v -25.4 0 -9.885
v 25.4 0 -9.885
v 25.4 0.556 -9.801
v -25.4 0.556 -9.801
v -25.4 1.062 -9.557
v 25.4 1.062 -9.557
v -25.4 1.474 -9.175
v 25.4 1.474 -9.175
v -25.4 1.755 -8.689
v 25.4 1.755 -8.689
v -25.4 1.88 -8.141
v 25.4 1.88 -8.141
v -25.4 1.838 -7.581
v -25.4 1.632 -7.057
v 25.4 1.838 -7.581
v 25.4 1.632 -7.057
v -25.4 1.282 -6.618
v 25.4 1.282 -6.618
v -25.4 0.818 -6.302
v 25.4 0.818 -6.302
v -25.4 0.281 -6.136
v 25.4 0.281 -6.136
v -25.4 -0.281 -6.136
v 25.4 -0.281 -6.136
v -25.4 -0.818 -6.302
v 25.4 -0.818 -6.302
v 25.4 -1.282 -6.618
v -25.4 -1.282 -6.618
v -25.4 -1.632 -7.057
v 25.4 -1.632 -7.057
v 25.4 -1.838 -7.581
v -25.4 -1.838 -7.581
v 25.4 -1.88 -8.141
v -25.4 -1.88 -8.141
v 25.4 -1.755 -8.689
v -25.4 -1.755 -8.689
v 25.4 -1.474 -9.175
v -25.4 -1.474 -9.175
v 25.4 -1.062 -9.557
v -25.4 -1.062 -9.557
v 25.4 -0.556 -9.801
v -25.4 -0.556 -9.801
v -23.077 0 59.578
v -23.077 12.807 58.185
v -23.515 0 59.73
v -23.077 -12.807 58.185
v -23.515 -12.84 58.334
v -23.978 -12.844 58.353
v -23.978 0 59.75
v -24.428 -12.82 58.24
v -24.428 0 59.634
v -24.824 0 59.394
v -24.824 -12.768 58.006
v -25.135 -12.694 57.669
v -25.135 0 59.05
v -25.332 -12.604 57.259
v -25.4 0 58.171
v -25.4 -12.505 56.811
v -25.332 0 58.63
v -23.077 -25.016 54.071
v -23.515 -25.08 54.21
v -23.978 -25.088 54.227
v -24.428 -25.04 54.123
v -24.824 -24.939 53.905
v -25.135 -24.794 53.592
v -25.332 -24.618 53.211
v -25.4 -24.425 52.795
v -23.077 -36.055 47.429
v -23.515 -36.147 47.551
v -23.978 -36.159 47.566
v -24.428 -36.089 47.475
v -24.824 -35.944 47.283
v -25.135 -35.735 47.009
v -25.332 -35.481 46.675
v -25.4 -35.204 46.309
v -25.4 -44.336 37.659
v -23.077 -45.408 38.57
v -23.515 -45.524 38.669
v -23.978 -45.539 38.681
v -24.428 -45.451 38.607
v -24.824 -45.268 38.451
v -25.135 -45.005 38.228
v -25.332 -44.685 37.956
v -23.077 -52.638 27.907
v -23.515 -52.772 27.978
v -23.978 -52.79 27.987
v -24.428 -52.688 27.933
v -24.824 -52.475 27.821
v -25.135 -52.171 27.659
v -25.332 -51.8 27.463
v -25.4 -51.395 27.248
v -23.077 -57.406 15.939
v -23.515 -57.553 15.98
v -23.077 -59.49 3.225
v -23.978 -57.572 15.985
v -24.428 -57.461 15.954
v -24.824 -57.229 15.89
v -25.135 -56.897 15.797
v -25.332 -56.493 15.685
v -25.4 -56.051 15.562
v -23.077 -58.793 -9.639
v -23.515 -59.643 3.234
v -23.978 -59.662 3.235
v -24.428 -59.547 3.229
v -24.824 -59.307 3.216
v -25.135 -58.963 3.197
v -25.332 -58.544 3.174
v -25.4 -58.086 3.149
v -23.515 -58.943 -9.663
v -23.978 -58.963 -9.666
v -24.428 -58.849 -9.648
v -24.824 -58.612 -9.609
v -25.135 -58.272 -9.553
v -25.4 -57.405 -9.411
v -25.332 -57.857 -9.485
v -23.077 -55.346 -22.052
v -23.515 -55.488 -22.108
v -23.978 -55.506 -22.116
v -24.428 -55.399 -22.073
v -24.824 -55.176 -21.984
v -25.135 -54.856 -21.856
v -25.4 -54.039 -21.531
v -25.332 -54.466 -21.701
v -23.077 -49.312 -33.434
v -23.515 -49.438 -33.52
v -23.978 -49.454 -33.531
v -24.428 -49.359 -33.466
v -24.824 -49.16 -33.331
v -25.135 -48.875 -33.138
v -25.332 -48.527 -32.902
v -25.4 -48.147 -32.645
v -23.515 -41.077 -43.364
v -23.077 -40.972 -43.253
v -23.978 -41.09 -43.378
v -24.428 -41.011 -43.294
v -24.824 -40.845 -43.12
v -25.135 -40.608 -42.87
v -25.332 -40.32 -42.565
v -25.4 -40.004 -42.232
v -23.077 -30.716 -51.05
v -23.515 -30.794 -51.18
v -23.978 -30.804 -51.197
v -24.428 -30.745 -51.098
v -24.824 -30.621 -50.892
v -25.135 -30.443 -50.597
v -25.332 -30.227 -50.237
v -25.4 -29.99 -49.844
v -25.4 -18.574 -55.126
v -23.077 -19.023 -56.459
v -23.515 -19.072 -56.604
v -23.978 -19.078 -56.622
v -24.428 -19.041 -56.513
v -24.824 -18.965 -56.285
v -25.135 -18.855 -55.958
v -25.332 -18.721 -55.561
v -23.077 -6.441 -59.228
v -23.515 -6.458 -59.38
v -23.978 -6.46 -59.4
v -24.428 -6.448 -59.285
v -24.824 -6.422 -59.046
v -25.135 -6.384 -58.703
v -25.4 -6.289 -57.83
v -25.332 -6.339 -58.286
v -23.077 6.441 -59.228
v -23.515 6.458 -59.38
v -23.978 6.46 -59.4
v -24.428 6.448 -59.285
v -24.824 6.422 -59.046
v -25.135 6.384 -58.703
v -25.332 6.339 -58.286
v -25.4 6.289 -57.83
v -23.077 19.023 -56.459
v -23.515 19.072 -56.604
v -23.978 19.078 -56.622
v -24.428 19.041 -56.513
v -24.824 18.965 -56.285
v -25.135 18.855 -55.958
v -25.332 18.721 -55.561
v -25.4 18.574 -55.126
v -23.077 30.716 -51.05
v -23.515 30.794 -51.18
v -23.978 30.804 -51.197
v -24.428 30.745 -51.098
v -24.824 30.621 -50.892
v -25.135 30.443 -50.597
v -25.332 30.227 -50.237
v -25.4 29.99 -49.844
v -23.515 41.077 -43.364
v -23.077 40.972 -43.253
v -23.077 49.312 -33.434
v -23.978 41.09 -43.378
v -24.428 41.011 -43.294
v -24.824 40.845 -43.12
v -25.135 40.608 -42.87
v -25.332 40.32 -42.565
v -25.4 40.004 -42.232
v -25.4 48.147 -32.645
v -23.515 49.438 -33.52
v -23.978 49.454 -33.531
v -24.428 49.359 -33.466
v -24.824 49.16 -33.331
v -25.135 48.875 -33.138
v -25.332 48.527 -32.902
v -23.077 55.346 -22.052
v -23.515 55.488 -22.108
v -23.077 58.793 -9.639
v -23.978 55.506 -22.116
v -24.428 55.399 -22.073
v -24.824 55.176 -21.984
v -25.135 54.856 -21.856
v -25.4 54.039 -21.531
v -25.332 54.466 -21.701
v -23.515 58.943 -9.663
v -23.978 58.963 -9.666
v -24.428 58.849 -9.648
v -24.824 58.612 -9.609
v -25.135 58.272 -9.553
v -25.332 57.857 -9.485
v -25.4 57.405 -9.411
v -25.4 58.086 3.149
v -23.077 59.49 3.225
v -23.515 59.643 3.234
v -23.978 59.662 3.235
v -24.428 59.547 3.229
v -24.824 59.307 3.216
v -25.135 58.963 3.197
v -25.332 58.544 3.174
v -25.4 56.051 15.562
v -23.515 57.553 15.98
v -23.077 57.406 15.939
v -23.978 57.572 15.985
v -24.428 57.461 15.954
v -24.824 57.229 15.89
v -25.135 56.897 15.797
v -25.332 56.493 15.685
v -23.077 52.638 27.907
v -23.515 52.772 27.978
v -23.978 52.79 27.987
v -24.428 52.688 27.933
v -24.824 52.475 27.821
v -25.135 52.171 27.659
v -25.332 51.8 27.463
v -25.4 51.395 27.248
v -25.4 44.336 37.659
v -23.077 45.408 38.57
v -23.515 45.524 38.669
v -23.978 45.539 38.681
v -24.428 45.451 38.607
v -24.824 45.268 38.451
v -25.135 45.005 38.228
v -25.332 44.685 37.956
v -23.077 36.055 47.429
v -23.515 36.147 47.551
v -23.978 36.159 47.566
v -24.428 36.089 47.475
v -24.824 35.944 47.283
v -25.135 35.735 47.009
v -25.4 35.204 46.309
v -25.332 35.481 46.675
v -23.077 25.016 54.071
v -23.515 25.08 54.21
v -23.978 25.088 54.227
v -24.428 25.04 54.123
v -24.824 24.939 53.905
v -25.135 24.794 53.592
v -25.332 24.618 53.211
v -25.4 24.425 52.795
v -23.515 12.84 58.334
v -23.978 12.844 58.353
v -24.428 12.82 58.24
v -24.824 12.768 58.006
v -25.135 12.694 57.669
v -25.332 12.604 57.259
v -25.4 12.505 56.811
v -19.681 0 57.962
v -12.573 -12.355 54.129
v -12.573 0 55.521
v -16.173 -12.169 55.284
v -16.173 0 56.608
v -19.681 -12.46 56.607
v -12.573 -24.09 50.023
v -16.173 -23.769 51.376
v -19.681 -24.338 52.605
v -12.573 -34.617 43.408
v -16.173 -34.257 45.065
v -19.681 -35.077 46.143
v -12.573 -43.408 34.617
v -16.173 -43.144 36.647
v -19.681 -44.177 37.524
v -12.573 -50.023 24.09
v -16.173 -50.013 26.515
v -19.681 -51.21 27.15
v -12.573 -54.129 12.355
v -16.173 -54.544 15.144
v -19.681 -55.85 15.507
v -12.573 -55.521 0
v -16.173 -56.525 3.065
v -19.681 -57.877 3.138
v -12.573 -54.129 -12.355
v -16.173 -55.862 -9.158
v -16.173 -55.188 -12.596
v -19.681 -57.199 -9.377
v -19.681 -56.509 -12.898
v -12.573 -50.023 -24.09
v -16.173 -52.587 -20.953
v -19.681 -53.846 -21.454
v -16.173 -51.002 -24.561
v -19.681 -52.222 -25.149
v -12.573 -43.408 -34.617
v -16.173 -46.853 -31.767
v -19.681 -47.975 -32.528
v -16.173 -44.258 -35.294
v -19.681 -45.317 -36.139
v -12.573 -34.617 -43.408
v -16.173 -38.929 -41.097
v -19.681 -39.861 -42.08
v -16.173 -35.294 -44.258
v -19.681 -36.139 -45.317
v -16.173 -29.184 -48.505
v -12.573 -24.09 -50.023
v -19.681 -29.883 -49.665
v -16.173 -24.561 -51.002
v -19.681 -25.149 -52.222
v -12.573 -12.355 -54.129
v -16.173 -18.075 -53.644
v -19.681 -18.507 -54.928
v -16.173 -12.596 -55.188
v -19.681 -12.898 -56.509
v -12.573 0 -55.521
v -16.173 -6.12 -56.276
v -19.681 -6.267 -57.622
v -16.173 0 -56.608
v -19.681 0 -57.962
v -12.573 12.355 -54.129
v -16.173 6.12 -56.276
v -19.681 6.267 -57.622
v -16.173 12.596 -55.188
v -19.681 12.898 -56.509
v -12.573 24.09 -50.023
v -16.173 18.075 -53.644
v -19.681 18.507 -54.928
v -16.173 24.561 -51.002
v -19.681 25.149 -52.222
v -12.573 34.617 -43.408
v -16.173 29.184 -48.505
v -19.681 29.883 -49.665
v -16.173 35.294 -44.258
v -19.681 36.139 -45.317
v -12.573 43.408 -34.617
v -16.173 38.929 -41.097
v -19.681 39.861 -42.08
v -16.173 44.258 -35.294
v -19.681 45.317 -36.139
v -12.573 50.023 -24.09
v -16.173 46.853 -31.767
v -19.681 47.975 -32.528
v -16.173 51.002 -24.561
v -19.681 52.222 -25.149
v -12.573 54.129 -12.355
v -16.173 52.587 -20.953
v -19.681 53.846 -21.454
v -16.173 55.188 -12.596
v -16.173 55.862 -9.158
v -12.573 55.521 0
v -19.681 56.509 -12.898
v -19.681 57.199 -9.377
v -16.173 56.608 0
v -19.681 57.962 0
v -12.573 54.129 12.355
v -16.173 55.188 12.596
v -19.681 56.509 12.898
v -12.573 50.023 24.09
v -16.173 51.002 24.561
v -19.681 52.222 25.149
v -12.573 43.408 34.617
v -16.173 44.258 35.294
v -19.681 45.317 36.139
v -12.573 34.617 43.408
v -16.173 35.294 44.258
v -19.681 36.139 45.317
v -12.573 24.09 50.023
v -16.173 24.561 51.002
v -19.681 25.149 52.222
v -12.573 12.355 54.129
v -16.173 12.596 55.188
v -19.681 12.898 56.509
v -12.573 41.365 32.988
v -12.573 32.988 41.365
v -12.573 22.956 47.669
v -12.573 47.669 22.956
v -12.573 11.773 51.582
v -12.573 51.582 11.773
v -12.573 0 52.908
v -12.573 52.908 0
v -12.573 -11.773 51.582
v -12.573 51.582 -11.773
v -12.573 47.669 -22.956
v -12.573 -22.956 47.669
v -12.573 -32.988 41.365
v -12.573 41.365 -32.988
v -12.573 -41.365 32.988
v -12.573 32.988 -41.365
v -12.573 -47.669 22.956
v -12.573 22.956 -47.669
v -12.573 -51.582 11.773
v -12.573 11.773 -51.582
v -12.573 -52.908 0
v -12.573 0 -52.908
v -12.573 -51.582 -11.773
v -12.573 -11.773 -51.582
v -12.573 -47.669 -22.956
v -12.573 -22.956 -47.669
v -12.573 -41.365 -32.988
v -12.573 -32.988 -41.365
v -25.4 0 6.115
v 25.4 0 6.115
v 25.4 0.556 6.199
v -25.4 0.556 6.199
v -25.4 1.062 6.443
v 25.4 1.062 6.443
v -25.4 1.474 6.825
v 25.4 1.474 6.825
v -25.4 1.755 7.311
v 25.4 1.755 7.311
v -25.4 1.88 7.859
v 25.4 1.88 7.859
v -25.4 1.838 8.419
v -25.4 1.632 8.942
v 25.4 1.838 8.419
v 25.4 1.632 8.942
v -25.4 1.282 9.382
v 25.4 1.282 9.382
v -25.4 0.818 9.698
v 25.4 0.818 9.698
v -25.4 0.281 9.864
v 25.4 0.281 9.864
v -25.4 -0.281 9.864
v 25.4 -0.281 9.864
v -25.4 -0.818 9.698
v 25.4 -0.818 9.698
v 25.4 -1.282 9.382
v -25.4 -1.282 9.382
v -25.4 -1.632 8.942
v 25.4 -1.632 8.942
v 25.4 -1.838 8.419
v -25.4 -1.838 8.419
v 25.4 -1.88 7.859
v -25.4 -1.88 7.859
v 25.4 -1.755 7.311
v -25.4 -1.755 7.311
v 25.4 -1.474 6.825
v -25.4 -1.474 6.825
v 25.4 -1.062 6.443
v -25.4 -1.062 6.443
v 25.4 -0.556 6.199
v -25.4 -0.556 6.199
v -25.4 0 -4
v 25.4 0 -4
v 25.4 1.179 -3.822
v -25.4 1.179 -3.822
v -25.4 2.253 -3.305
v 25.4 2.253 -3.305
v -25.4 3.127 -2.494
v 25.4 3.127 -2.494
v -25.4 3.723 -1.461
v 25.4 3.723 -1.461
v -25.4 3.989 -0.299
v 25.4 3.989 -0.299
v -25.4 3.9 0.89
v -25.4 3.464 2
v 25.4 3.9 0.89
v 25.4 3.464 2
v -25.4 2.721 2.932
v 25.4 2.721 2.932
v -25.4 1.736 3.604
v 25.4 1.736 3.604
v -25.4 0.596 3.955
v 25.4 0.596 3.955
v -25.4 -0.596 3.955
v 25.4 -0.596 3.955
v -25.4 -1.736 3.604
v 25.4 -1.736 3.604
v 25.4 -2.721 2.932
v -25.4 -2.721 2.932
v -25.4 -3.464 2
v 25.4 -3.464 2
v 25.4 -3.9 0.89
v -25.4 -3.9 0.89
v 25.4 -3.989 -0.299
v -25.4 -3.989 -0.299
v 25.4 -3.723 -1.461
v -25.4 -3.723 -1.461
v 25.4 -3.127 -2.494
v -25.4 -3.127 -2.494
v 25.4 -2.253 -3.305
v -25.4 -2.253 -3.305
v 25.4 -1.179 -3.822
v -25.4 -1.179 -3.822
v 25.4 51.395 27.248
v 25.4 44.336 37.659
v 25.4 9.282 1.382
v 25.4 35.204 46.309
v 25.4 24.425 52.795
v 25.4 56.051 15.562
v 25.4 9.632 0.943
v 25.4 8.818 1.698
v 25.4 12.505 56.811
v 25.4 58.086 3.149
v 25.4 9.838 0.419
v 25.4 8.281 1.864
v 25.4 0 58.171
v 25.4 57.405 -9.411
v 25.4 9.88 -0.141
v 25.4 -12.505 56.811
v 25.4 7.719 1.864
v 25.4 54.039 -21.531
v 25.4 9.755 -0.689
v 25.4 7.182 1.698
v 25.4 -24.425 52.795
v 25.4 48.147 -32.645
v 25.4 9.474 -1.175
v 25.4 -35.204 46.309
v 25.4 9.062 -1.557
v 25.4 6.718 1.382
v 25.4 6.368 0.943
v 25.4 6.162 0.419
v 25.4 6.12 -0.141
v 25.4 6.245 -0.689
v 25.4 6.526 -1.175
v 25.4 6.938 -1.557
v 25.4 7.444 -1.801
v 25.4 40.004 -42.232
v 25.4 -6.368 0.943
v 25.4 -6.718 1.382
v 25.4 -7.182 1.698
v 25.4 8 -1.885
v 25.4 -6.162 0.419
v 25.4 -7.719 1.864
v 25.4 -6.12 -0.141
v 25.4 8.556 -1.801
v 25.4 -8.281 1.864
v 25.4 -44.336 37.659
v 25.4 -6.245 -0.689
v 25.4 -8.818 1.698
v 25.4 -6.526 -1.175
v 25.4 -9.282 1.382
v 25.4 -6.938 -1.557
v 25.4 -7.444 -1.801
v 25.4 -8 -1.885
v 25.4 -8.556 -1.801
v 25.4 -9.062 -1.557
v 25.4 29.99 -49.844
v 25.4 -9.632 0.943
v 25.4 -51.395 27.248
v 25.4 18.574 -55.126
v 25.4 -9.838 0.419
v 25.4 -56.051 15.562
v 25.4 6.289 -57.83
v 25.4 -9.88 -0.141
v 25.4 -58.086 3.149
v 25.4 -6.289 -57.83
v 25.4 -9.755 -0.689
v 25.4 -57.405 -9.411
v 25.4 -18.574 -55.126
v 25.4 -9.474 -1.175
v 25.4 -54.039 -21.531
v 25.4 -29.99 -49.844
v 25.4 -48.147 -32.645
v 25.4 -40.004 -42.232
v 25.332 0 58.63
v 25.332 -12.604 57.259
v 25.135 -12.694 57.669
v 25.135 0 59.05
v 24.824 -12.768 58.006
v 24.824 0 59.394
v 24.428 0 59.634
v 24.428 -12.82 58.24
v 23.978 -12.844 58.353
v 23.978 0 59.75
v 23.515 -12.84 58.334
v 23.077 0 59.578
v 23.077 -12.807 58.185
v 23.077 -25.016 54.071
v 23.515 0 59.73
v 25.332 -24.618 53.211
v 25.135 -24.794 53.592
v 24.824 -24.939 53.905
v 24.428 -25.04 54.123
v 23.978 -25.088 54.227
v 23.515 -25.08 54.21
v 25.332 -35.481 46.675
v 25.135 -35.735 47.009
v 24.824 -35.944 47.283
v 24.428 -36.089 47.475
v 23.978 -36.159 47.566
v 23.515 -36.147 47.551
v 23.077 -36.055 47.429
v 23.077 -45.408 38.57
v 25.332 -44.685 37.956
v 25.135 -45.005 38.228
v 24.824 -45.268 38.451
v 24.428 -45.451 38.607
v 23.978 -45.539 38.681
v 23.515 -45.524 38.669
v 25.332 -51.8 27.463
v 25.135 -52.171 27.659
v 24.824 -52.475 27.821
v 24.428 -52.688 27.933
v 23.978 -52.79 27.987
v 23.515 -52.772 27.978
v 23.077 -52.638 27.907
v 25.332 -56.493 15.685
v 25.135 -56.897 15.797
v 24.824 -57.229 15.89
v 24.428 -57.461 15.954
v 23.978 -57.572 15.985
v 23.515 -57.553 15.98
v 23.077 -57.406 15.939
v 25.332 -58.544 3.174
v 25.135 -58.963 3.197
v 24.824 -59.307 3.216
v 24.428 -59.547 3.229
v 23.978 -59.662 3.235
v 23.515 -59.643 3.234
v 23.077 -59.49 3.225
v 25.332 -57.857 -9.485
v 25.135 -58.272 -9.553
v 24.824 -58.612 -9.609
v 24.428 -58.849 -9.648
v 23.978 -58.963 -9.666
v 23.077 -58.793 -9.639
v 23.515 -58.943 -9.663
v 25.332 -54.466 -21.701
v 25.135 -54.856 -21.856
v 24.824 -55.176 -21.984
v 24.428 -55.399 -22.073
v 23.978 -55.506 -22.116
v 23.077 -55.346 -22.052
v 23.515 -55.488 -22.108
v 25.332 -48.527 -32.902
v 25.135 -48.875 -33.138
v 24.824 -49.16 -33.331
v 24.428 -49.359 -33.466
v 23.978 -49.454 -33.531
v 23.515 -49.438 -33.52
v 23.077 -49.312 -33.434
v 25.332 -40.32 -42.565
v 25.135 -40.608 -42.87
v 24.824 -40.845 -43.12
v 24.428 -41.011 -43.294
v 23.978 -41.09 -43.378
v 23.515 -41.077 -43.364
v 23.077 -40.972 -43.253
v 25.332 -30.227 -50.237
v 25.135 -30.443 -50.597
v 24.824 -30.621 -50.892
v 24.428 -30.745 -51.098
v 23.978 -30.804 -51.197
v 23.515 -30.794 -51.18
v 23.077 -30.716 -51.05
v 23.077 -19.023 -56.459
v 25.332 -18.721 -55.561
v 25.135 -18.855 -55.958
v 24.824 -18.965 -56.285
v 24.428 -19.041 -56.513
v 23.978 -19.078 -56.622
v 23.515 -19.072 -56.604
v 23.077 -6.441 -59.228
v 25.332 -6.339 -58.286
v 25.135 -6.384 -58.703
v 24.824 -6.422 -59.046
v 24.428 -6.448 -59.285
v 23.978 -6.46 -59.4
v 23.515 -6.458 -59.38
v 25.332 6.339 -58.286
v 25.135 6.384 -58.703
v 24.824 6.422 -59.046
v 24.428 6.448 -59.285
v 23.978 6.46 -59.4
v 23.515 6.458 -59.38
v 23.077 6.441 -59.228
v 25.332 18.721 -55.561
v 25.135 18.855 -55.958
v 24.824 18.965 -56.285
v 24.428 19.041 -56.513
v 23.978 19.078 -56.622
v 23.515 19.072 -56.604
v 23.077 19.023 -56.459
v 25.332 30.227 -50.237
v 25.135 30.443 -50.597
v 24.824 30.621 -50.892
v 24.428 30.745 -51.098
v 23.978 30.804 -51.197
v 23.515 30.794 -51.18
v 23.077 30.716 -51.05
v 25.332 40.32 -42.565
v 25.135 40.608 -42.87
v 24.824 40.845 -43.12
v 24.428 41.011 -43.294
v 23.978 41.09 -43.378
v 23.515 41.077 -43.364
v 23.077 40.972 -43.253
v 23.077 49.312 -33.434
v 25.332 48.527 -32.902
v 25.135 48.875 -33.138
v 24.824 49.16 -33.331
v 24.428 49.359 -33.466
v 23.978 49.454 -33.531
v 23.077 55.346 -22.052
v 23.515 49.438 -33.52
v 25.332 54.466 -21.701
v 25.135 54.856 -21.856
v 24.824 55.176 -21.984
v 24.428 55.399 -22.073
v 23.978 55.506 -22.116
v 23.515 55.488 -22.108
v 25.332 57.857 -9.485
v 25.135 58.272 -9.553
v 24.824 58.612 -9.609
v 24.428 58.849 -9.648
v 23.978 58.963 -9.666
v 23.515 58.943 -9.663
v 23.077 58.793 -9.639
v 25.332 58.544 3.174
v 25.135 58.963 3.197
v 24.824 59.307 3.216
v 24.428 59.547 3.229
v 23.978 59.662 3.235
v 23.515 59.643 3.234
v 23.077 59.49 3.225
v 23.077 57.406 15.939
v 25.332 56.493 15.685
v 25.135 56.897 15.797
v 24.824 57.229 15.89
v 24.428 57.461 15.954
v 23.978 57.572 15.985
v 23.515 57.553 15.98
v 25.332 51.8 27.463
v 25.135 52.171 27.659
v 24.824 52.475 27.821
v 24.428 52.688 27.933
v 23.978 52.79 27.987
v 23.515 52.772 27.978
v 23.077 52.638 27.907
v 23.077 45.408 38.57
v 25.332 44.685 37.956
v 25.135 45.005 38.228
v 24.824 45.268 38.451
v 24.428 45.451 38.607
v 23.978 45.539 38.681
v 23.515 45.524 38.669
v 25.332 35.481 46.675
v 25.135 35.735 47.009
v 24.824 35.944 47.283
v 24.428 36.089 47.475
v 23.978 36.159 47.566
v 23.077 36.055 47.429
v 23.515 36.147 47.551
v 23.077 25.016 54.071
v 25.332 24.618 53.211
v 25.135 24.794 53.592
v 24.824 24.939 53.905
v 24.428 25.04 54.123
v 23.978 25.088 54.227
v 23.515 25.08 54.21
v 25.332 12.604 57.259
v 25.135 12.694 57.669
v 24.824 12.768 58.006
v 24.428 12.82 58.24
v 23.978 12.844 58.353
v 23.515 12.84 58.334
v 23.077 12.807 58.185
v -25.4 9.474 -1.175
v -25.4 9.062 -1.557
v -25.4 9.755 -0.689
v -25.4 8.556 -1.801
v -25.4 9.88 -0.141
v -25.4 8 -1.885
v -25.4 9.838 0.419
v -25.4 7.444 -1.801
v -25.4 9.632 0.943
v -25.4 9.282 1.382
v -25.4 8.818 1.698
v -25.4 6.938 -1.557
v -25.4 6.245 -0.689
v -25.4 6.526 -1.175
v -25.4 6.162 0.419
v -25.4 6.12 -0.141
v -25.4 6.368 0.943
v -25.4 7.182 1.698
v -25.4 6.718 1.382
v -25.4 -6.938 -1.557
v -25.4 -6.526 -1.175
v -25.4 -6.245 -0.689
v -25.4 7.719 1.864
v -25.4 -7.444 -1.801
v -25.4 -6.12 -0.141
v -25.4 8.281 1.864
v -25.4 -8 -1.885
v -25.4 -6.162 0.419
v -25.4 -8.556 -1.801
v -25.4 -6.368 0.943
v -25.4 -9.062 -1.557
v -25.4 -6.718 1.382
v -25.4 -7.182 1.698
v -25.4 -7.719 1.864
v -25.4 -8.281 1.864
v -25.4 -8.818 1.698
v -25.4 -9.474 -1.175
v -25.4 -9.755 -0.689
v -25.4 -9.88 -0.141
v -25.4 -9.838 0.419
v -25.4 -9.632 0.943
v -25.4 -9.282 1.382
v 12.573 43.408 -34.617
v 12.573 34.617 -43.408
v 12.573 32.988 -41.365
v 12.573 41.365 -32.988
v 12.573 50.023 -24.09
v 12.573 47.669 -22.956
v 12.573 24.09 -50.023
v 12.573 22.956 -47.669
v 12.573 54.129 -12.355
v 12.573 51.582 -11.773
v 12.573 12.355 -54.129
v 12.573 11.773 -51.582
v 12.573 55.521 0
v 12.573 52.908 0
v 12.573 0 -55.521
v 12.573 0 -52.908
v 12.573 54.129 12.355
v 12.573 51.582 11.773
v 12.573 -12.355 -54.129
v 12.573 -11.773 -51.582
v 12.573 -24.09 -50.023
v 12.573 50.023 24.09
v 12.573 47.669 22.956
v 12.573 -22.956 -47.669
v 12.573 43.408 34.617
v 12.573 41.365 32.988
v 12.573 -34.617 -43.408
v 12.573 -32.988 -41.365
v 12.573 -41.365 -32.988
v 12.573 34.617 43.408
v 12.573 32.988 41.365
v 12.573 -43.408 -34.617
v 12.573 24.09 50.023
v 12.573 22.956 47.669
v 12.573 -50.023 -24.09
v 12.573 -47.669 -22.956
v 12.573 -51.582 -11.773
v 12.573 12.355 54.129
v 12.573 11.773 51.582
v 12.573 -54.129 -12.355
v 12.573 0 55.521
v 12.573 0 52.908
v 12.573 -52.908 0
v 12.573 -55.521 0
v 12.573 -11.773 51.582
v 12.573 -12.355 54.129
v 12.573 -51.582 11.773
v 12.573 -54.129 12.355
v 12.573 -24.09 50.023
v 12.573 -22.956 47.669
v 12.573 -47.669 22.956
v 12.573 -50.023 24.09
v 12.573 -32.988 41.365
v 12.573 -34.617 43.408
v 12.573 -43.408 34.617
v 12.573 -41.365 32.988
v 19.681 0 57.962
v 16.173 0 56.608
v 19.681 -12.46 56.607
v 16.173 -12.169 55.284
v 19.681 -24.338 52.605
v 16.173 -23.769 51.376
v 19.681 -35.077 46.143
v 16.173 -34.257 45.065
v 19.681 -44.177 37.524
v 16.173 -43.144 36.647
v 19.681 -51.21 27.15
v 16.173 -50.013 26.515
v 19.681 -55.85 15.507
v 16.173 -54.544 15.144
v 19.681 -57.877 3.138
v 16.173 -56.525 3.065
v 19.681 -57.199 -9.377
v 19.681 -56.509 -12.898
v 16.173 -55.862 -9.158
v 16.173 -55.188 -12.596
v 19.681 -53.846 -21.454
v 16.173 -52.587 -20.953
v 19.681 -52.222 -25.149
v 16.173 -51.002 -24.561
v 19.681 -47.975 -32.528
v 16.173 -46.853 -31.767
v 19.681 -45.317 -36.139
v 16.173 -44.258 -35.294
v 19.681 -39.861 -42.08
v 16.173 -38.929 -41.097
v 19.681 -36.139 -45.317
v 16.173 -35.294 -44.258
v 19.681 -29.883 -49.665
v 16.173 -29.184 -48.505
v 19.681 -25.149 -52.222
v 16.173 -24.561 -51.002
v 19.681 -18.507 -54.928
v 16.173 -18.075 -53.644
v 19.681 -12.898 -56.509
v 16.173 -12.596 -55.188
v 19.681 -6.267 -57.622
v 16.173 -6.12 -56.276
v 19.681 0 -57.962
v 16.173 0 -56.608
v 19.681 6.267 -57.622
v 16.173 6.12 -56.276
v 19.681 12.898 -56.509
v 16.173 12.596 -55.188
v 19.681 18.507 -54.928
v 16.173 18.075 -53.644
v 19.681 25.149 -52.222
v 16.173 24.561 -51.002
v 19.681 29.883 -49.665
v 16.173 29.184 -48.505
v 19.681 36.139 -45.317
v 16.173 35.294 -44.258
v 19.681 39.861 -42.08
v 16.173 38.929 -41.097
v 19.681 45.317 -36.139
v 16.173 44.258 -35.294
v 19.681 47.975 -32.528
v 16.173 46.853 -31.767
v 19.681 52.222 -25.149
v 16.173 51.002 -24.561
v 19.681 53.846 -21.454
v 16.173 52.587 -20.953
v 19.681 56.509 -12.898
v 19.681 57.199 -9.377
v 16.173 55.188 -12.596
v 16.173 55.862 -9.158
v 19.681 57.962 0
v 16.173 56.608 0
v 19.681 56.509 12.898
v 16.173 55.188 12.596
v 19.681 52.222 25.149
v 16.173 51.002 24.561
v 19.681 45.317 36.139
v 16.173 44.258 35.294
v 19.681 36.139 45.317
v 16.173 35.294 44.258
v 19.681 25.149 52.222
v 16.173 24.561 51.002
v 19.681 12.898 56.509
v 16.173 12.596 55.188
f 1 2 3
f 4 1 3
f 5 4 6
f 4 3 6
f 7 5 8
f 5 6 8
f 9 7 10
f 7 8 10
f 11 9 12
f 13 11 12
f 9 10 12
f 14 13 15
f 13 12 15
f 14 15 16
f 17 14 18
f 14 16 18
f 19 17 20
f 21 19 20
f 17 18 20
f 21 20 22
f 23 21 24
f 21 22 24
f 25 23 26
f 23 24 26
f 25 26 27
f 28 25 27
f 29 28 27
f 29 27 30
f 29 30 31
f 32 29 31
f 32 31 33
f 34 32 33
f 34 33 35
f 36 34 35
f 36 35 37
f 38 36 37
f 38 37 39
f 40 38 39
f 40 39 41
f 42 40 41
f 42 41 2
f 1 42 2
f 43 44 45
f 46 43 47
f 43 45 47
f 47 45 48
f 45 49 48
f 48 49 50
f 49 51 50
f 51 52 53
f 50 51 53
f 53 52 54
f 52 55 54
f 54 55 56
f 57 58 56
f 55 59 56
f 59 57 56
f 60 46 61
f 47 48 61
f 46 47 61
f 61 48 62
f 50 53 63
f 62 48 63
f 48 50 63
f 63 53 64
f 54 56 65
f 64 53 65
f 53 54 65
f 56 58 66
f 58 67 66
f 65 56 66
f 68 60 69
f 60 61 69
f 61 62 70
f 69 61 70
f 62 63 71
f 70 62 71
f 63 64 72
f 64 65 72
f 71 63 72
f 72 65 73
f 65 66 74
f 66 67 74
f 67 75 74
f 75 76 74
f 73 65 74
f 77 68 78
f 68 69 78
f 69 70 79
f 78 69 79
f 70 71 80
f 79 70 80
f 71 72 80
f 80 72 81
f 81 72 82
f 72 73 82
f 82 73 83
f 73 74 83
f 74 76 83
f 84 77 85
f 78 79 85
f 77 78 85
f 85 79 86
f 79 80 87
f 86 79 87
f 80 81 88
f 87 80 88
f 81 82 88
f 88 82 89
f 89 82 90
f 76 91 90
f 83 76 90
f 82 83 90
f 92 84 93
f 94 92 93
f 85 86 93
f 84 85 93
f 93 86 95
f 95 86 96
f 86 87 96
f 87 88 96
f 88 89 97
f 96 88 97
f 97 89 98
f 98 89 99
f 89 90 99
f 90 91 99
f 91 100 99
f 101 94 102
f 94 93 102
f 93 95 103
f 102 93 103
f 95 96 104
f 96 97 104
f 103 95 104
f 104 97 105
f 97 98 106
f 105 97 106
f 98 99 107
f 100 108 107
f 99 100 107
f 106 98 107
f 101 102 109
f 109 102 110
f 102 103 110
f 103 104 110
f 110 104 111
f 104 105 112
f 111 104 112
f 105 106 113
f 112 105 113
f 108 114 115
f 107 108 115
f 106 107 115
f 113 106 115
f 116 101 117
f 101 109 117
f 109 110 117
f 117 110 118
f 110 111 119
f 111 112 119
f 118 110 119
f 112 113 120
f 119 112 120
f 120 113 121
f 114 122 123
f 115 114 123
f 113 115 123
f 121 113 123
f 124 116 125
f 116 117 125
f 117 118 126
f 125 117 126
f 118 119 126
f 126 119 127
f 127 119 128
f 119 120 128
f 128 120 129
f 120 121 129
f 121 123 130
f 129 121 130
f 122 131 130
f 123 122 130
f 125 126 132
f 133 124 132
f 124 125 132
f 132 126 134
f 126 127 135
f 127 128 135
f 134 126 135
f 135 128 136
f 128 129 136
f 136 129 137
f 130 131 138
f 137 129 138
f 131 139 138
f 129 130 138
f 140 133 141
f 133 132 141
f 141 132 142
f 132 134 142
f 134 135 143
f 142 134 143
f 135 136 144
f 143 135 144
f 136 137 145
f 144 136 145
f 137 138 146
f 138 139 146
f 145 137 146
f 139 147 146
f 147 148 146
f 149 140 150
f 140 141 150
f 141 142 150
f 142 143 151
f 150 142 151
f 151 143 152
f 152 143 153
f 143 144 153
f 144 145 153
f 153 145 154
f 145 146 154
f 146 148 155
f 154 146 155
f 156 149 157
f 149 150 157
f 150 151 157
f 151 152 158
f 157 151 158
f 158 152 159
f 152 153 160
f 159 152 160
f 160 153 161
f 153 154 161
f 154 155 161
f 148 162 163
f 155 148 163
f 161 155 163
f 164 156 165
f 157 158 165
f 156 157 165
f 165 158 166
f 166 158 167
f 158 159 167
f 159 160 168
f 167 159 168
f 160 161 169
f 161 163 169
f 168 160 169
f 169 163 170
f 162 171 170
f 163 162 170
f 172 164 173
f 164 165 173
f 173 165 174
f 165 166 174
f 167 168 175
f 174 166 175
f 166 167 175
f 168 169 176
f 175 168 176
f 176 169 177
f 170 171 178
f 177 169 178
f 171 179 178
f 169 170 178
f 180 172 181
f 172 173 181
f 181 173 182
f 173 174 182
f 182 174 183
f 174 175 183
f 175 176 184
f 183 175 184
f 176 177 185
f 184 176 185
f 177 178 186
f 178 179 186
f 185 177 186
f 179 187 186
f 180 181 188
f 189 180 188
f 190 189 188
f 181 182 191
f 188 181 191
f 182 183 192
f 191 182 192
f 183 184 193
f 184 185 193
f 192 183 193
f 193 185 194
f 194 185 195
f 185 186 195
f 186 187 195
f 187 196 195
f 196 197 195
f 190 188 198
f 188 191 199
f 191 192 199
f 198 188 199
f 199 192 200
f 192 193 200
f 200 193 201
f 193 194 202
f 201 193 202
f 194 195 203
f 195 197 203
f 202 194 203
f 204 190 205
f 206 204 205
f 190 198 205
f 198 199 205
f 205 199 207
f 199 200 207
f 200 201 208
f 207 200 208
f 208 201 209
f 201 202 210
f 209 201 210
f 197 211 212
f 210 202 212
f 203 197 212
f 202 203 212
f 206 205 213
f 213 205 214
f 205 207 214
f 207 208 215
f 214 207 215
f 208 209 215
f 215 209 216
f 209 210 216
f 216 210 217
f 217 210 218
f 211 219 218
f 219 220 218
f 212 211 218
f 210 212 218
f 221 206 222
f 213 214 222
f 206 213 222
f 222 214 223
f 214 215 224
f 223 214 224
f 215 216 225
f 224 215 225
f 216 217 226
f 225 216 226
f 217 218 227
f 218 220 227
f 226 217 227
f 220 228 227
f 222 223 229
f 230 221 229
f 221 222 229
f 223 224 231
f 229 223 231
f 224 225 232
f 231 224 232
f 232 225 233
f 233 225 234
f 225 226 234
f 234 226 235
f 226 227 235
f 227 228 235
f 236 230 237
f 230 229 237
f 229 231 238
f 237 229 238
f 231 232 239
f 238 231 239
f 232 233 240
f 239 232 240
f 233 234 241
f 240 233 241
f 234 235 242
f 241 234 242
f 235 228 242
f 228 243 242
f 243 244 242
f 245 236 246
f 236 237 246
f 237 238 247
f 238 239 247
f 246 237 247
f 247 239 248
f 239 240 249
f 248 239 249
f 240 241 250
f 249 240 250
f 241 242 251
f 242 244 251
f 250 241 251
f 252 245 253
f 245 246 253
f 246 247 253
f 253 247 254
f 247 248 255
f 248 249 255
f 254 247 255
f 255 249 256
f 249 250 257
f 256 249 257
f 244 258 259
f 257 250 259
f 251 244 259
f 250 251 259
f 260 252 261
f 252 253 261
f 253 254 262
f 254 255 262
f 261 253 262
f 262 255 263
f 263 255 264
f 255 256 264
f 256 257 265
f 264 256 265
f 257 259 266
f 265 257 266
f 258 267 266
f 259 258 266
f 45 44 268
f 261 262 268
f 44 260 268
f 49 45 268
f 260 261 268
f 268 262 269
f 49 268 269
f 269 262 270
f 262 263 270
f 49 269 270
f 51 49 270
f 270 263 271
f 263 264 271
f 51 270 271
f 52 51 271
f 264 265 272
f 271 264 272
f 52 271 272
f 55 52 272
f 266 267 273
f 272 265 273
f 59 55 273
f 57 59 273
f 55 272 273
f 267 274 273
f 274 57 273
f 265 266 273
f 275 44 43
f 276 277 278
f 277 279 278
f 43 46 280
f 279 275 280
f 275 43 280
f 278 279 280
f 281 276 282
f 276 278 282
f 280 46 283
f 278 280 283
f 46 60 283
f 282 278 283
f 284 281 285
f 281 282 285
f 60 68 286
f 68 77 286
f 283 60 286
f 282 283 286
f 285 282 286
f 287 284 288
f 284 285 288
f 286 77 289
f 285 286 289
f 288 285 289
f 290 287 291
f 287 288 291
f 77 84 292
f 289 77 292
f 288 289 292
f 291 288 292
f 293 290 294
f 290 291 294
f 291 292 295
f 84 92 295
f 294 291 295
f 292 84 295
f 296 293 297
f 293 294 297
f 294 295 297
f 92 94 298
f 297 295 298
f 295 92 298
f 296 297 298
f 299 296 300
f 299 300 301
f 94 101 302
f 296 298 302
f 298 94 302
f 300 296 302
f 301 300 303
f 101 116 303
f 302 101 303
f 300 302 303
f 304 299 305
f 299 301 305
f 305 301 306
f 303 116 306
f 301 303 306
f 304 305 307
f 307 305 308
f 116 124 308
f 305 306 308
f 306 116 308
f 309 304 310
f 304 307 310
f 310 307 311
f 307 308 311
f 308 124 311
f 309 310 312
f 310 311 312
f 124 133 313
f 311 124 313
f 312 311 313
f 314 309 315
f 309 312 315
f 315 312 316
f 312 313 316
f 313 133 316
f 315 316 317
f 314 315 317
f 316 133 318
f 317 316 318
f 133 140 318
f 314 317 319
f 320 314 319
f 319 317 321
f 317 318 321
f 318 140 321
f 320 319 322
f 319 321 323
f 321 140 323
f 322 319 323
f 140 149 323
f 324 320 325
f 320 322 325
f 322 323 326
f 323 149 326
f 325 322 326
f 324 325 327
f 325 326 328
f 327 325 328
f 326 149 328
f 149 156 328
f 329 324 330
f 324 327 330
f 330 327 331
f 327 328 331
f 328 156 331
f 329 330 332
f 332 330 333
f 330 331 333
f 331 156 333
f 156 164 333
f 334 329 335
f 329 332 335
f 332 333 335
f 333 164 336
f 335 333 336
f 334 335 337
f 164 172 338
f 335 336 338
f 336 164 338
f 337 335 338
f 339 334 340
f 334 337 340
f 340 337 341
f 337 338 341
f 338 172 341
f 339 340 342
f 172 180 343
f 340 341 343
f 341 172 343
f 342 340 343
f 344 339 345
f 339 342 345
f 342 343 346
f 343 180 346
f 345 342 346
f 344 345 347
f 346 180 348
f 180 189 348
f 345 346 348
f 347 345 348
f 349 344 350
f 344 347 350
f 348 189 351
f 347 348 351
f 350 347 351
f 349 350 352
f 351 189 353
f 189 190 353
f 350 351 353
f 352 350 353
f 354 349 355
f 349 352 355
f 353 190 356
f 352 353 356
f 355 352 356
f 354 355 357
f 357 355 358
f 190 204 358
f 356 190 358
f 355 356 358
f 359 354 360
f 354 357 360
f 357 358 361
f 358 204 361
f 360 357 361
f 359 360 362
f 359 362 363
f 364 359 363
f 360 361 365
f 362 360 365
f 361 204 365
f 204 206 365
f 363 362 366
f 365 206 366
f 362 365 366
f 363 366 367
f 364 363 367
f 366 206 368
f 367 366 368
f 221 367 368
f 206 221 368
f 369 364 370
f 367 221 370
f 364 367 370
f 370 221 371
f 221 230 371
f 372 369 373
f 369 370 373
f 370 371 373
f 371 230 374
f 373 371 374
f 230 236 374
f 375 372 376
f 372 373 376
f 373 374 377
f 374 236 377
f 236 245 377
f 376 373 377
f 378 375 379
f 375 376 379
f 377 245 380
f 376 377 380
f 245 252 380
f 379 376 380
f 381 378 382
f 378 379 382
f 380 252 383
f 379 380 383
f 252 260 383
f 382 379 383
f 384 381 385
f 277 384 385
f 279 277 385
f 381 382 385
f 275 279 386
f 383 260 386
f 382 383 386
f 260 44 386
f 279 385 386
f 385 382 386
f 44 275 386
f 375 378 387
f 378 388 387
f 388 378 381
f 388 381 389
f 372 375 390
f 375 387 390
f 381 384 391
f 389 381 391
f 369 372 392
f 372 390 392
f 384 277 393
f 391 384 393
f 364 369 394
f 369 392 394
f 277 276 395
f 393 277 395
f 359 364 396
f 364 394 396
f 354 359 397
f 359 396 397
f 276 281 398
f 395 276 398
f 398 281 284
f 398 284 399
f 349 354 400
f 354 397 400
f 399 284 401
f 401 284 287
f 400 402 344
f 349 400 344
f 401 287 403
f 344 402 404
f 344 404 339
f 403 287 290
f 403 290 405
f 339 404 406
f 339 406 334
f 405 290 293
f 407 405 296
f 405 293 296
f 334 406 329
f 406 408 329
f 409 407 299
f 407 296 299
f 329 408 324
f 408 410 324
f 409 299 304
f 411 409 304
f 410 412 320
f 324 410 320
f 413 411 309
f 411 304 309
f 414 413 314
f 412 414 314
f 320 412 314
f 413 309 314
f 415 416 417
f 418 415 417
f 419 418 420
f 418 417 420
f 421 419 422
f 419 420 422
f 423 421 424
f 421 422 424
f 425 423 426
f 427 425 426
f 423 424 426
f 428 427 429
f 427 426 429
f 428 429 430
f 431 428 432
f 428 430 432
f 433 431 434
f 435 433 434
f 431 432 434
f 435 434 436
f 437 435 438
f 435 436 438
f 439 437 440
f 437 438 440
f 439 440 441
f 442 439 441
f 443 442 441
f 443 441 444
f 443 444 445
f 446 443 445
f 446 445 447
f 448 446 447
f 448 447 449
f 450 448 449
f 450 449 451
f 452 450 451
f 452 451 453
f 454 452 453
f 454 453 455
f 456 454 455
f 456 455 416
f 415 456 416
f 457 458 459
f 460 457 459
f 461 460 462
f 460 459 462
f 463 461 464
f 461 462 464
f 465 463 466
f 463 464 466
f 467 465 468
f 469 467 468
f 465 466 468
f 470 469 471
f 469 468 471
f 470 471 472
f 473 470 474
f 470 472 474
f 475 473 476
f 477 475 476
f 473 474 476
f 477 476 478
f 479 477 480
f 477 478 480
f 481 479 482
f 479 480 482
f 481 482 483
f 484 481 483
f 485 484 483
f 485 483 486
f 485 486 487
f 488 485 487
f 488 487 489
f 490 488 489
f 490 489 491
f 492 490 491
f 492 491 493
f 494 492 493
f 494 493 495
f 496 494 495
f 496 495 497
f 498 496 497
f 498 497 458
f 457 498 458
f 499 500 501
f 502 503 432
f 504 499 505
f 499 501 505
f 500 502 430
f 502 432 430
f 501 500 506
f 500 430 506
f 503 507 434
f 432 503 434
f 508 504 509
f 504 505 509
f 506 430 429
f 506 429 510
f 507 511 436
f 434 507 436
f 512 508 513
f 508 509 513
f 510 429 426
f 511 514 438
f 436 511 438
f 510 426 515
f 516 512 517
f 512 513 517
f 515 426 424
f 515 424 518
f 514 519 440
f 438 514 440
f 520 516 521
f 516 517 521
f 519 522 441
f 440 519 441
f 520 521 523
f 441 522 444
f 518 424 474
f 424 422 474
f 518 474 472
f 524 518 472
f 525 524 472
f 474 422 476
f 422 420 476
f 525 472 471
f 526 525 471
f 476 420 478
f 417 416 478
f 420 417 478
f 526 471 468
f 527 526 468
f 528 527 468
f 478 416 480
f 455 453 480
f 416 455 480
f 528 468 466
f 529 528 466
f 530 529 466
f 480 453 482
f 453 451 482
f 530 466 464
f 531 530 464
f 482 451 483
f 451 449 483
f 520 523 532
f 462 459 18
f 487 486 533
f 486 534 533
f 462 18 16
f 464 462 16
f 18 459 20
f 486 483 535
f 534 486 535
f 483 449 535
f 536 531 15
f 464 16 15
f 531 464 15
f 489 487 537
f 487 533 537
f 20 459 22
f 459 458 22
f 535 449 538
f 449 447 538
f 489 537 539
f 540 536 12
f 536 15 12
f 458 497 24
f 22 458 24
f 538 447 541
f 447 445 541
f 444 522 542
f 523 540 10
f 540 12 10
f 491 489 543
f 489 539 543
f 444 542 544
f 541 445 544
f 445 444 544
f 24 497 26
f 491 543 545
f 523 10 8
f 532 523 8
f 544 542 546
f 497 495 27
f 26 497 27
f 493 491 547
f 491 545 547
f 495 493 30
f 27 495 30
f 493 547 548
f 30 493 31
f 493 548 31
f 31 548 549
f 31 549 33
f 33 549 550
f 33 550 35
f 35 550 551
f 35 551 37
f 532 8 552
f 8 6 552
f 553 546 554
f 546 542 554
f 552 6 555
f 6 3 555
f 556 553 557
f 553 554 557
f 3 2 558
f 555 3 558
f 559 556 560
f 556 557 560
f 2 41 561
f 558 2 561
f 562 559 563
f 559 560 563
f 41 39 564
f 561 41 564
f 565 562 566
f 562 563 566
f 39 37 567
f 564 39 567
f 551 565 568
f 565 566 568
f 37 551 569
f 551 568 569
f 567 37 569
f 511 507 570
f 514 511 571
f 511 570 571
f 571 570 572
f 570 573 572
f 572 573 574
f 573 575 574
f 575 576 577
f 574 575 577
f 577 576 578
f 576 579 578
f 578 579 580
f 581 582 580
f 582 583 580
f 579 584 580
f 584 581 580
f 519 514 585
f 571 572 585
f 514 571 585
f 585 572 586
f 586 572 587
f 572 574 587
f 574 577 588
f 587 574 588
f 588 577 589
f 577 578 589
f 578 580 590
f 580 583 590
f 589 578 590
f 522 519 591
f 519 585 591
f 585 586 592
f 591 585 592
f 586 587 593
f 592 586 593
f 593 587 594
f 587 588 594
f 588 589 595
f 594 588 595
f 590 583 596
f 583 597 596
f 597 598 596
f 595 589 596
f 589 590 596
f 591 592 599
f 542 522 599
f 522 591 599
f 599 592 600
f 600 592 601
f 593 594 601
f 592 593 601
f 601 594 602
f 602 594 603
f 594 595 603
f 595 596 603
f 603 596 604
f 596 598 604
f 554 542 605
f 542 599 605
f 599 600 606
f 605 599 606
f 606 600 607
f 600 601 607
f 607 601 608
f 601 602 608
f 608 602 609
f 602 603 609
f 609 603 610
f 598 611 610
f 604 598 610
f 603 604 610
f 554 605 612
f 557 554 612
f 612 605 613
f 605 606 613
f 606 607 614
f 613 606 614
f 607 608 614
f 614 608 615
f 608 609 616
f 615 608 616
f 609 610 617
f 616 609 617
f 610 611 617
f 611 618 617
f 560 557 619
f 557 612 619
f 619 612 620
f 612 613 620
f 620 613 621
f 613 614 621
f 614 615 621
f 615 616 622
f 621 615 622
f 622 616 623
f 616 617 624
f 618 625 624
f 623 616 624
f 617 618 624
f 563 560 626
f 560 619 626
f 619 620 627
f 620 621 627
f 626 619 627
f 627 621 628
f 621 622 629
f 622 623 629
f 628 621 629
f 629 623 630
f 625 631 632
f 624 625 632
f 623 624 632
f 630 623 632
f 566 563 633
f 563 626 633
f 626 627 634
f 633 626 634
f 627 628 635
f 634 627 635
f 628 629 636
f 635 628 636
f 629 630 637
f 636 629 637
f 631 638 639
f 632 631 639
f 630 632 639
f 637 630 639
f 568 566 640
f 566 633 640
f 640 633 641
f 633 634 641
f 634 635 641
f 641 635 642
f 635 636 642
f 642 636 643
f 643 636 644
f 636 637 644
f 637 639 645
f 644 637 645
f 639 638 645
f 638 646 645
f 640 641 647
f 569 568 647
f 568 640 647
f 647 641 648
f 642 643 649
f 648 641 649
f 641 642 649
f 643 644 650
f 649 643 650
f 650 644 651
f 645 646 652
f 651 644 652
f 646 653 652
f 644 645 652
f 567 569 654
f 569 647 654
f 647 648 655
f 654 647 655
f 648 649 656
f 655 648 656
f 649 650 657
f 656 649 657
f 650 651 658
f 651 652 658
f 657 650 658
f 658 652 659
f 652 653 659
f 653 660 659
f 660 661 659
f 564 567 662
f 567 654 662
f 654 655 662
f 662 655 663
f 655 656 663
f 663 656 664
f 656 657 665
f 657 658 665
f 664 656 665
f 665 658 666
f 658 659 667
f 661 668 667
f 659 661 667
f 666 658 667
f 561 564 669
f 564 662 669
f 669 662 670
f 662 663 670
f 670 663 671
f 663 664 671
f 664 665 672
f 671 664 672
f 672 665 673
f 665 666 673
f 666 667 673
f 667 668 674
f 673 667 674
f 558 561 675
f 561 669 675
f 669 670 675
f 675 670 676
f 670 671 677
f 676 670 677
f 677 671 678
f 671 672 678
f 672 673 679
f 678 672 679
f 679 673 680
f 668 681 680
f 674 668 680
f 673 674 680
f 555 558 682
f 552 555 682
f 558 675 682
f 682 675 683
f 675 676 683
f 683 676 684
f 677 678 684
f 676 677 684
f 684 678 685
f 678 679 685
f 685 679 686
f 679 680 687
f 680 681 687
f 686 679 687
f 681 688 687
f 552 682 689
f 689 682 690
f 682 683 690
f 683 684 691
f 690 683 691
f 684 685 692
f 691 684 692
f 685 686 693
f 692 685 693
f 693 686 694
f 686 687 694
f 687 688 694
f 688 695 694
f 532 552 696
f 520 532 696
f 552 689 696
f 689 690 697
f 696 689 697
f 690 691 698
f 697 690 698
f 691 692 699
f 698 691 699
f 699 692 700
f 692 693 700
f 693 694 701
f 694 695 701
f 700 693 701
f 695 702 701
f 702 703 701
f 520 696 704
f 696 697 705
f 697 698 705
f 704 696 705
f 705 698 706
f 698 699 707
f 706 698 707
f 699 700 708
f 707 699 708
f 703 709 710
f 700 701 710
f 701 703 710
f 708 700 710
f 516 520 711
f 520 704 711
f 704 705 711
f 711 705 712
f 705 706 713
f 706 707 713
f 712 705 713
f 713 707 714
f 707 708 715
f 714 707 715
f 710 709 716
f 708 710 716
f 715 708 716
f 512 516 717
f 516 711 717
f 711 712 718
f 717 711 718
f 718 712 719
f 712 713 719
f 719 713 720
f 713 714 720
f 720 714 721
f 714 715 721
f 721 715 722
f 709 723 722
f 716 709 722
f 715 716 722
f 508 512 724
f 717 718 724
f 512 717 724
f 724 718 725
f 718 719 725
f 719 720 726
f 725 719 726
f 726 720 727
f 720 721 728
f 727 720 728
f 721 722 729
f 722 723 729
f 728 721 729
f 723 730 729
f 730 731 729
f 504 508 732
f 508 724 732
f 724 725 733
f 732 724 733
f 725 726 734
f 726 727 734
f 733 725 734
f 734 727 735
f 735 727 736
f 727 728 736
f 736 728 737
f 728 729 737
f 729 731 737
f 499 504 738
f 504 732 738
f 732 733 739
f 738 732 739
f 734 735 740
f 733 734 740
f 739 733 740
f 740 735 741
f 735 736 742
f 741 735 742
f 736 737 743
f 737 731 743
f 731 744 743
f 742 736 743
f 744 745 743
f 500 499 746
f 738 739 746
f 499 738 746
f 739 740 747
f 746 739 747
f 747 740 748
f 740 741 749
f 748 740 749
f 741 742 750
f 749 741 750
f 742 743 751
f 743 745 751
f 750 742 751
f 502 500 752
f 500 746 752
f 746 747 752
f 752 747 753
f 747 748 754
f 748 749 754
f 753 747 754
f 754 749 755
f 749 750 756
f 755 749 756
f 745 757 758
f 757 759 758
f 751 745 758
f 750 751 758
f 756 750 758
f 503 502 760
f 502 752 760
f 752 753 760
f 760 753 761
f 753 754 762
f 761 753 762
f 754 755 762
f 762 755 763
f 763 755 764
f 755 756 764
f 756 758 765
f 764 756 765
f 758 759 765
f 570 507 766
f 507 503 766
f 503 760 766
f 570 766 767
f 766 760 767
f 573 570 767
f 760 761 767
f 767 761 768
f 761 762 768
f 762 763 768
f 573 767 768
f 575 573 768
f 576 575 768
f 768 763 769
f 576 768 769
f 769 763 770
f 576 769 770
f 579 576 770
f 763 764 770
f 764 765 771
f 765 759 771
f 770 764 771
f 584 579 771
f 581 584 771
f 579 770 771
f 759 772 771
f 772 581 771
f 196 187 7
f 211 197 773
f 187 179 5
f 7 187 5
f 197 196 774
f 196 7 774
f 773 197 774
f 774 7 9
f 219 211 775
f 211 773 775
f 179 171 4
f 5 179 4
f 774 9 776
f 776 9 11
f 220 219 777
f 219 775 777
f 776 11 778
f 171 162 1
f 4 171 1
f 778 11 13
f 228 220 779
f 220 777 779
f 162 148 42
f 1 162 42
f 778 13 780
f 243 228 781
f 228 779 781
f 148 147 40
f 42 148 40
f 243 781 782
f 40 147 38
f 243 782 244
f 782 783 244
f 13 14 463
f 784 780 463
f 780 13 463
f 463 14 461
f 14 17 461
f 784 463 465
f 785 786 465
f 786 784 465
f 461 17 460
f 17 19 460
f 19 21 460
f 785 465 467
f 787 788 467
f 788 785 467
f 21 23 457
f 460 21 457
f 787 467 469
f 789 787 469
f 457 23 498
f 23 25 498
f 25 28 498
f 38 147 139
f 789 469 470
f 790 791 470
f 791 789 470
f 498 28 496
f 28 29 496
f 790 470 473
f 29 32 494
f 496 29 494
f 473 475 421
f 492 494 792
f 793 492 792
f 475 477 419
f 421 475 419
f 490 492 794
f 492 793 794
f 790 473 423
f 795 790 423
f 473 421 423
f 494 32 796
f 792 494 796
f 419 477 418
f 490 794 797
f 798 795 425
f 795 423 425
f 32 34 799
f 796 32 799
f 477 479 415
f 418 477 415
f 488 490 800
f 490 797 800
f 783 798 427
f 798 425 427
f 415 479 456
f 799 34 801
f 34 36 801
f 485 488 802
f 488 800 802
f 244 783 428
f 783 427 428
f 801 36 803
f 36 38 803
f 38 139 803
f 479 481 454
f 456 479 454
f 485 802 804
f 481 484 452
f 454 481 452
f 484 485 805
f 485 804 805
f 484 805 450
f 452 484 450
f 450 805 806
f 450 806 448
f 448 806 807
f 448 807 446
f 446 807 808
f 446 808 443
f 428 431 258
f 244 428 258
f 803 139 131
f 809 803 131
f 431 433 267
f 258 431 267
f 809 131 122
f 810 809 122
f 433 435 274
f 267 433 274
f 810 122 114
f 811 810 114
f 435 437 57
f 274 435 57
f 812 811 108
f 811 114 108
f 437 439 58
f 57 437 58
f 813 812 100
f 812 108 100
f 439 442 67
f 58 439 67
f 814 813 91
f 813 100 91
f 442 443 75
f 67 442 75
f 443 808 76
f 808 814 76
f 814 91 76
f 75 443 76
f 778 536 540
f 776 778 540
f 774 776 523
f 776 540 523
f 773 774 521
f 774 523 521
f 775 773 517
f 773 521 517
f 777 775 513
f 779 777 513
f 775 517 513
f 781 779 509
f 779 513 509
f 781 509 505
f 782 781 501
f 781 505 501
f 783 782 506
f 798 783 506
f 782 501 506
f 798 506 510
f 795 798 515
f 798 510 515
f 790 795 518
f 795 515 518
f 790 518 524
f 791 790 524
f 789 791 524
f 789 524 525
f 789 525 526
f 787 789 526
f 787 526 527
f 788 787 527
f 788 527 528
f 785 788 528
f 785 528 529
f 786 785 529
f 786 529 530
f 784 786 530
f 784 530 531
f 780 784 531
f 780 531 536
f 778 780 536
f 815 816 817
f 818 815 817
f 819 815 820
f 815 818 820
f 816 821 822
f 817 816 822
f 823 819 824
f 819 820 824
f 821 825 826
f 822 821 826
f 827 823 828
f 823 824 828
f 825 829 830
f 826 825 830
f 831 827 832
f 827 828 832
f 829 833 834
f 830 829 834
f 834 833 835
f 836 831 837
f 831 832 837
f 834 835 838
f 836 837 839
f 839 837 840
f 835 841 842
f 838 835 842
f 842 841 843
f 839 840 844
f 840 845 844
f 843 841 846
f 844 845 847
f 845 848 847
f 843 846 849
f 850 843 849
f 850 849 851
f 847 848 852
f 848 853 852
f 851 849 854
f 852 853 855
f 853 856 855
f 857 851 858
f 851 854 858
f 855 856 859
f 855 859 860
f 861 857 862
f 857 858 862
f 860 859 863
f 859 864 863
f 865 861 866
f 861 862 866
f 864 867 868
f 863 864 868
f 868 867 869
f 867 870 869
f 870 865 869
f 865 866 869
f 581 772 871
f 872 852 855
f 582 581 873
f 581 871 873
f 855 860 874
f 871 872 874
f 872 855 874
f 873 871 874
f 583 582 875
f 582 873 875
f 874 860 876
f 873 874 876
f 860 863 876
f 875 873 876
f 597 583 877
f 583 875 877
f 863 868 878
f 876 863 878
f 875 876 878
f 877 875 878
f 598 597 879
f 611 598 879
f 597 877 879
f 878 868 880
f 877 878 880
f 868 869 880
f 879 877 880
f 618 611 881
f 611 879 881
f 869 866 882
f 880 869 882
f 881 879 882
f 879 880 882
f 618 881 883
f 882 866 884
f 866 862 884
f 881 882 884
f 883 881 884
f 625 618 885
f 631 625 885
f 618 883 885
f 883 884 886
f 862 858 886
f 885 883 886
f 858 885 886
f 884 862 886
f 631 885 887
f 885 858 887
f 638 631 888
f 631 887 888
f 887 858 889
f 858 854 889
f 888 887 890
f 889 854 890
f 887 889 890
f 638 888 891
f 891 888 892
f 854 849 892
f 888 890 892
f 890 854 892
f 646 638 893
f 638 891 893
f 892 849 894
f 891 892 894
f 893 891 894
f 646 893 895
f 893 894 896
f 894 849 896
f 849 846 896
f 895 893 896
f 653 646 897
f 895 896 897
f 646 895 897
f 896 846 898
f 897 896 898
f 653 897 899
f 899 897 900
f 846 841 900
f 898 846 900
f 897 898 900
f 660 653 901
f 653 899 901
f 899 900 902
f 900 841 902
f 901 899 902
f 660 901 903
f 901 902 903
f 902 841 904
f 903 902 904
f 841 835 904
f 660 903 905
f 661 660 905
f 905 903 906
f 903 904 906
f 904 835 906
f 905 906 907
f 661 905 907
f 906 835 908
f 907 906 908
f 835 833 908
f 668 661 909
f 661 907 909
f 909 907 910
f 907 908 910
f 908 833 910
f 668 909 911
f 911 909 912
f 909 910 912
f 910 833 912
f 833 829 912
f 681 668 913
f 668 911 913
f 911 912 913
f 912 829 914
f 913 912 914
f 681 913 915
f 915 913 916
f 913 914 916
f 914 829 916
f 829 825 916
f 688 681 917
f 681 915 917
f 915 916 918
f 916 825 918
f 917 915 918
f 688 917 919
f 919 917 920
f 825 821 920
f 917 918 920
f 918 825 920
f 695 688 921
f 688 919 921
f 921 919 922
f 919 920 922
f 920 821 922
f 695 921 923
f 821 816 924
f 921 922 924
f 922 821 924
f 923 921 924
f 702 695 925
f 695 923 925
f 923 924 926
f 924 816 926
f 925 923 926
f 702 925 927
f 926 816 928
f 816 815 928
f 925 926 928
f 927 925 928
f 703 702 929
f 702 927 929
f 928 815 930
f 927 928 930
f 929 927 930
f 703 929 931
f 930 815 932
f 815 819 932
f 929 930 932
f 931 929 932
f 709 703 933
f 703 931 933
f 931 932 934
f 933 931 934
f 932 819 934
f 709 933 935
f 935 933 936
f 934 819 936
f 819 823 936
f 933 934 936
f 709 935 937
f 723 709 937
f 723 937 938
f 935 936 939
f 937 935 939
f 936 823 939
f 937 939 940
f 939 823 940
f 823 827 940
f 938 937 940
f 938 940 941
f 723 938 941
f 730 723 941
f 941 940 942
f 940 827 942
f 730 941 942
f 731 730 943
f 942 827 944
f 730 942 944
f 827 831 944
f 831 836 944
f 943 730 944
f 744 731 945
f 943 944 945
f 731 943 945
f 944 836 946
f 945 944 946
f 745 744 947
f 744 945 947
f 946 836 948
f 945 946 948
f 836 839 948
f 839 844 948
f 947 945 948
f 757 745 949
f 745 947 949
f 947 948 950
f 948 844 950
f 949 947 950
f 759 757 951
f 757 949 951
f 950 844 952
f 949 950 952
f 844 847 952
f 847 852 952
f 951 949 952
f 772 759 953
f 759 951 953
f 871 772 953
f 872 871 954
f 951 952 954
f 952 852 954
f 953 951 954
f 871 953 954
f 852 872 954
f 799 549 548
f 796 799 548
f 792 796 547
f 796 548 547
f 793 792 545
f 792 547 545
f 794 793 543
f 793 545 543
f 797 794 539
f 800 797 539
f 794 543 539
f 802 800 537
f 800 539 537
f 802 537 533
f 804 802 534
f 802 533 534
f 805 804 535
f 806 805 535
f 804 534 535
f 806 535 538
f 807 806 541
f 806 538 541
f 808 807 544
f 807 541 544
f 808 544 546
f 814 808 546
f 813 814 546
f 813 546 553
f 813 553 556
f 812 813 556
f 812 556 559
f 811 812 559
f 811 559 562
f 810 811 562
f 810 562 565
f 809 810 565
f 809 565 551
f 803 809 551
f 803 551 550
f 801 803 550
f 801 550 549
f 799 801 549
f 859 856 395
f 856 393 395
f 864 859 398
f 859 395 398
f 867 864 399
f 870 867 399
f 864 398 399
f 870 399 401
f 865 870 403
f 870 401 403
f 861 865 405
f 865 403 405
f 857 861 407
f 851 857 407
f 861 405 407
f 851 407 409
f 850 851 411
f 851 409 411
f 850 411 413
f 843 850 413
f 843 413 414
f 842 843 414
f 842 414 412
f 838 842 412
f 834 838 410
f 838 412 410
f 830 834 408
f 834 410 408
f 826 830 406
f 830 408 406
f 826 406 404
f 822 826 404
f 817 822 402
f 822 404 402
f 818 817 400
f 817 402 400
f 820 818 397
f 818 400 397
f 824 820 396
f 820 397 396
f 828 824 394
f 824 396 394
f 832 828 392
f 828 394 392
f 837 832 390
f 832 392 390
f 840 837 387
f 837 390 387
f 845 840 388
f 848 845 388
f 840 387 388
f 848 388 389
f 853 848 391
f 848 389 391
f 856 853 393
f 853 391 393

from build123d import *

# Parameters (mm, degrees)
FLOWER_R       = 4
FLOWER_R_2     = 1.885
MOUNTING_DEPTH = 99.604197228


with BuildPart() as part:
    # Wheel Arc → Wheel (revolve)
    with BuildSketch(Plane.XY, mode=Mode.PRIVATE) as wheel_sk:
        with BuildLine():
            Line((-25.4, 0), (25.4, 0))
            Line((25.4, 0), (25.4, -58.170962527))
            ThreePointArc((25.4, -58.170962527), (24.634795193, -59.528897306), (23.076866942, -59.577731965))
            ThreePointArc((23.076866942, -59.577731965), (17.93994263, -57.251785424), (12.573, -55.521483285))
            Line((12.573, -55.521483285), (12.573, -52.9082))
            Line((12.573, -52.9082), (-12.573, -52.9082))
            Line((-12.573, -52.9082), (-12.573, -55.521483285))
            ThreePointArc((-12.573, -55.521483285), (-17.93994263, -57.251785424), (-23.076866942, -59.577731965))
            ThreePointArc((-23.076866942, -59.577731965), (-24.634795193, -59.528897306), (-25.4, -58.170962527))
            Line((-25.4, -58.170962527), (-25.4, 0))
        make_face()
    revolve(wheel_sk.sketch.rotate(Axis((-40.905271883, 0, 0), (1, 0, 0)), 270), axis=Axis((-40.905271883, 0, 0), (1, 0, 0)))

    # Flower → Mounting (cut, through all)
    with BuildSketch(Plane(origin=(25.4, 0, 0), x_dir=(0, 0, -1), z_dir=(1, 0, 0))):
        Circle(FLOWER_R)
        with Locations((0, 8)):
            Circle(FLOWER_R_2)
        with Locations((8, 0)):
            Circle(FLOWER_R_2)
        with Locations((0, -8)):
            Circle(FLOWER_R_2)
        with Locations((-8, 0)):
            Circle(FLOWER_R_2)
    extrude(amount=-MOUNTING_DEPTH, mode=Mode.SUBTRACT)


solid = part.part
